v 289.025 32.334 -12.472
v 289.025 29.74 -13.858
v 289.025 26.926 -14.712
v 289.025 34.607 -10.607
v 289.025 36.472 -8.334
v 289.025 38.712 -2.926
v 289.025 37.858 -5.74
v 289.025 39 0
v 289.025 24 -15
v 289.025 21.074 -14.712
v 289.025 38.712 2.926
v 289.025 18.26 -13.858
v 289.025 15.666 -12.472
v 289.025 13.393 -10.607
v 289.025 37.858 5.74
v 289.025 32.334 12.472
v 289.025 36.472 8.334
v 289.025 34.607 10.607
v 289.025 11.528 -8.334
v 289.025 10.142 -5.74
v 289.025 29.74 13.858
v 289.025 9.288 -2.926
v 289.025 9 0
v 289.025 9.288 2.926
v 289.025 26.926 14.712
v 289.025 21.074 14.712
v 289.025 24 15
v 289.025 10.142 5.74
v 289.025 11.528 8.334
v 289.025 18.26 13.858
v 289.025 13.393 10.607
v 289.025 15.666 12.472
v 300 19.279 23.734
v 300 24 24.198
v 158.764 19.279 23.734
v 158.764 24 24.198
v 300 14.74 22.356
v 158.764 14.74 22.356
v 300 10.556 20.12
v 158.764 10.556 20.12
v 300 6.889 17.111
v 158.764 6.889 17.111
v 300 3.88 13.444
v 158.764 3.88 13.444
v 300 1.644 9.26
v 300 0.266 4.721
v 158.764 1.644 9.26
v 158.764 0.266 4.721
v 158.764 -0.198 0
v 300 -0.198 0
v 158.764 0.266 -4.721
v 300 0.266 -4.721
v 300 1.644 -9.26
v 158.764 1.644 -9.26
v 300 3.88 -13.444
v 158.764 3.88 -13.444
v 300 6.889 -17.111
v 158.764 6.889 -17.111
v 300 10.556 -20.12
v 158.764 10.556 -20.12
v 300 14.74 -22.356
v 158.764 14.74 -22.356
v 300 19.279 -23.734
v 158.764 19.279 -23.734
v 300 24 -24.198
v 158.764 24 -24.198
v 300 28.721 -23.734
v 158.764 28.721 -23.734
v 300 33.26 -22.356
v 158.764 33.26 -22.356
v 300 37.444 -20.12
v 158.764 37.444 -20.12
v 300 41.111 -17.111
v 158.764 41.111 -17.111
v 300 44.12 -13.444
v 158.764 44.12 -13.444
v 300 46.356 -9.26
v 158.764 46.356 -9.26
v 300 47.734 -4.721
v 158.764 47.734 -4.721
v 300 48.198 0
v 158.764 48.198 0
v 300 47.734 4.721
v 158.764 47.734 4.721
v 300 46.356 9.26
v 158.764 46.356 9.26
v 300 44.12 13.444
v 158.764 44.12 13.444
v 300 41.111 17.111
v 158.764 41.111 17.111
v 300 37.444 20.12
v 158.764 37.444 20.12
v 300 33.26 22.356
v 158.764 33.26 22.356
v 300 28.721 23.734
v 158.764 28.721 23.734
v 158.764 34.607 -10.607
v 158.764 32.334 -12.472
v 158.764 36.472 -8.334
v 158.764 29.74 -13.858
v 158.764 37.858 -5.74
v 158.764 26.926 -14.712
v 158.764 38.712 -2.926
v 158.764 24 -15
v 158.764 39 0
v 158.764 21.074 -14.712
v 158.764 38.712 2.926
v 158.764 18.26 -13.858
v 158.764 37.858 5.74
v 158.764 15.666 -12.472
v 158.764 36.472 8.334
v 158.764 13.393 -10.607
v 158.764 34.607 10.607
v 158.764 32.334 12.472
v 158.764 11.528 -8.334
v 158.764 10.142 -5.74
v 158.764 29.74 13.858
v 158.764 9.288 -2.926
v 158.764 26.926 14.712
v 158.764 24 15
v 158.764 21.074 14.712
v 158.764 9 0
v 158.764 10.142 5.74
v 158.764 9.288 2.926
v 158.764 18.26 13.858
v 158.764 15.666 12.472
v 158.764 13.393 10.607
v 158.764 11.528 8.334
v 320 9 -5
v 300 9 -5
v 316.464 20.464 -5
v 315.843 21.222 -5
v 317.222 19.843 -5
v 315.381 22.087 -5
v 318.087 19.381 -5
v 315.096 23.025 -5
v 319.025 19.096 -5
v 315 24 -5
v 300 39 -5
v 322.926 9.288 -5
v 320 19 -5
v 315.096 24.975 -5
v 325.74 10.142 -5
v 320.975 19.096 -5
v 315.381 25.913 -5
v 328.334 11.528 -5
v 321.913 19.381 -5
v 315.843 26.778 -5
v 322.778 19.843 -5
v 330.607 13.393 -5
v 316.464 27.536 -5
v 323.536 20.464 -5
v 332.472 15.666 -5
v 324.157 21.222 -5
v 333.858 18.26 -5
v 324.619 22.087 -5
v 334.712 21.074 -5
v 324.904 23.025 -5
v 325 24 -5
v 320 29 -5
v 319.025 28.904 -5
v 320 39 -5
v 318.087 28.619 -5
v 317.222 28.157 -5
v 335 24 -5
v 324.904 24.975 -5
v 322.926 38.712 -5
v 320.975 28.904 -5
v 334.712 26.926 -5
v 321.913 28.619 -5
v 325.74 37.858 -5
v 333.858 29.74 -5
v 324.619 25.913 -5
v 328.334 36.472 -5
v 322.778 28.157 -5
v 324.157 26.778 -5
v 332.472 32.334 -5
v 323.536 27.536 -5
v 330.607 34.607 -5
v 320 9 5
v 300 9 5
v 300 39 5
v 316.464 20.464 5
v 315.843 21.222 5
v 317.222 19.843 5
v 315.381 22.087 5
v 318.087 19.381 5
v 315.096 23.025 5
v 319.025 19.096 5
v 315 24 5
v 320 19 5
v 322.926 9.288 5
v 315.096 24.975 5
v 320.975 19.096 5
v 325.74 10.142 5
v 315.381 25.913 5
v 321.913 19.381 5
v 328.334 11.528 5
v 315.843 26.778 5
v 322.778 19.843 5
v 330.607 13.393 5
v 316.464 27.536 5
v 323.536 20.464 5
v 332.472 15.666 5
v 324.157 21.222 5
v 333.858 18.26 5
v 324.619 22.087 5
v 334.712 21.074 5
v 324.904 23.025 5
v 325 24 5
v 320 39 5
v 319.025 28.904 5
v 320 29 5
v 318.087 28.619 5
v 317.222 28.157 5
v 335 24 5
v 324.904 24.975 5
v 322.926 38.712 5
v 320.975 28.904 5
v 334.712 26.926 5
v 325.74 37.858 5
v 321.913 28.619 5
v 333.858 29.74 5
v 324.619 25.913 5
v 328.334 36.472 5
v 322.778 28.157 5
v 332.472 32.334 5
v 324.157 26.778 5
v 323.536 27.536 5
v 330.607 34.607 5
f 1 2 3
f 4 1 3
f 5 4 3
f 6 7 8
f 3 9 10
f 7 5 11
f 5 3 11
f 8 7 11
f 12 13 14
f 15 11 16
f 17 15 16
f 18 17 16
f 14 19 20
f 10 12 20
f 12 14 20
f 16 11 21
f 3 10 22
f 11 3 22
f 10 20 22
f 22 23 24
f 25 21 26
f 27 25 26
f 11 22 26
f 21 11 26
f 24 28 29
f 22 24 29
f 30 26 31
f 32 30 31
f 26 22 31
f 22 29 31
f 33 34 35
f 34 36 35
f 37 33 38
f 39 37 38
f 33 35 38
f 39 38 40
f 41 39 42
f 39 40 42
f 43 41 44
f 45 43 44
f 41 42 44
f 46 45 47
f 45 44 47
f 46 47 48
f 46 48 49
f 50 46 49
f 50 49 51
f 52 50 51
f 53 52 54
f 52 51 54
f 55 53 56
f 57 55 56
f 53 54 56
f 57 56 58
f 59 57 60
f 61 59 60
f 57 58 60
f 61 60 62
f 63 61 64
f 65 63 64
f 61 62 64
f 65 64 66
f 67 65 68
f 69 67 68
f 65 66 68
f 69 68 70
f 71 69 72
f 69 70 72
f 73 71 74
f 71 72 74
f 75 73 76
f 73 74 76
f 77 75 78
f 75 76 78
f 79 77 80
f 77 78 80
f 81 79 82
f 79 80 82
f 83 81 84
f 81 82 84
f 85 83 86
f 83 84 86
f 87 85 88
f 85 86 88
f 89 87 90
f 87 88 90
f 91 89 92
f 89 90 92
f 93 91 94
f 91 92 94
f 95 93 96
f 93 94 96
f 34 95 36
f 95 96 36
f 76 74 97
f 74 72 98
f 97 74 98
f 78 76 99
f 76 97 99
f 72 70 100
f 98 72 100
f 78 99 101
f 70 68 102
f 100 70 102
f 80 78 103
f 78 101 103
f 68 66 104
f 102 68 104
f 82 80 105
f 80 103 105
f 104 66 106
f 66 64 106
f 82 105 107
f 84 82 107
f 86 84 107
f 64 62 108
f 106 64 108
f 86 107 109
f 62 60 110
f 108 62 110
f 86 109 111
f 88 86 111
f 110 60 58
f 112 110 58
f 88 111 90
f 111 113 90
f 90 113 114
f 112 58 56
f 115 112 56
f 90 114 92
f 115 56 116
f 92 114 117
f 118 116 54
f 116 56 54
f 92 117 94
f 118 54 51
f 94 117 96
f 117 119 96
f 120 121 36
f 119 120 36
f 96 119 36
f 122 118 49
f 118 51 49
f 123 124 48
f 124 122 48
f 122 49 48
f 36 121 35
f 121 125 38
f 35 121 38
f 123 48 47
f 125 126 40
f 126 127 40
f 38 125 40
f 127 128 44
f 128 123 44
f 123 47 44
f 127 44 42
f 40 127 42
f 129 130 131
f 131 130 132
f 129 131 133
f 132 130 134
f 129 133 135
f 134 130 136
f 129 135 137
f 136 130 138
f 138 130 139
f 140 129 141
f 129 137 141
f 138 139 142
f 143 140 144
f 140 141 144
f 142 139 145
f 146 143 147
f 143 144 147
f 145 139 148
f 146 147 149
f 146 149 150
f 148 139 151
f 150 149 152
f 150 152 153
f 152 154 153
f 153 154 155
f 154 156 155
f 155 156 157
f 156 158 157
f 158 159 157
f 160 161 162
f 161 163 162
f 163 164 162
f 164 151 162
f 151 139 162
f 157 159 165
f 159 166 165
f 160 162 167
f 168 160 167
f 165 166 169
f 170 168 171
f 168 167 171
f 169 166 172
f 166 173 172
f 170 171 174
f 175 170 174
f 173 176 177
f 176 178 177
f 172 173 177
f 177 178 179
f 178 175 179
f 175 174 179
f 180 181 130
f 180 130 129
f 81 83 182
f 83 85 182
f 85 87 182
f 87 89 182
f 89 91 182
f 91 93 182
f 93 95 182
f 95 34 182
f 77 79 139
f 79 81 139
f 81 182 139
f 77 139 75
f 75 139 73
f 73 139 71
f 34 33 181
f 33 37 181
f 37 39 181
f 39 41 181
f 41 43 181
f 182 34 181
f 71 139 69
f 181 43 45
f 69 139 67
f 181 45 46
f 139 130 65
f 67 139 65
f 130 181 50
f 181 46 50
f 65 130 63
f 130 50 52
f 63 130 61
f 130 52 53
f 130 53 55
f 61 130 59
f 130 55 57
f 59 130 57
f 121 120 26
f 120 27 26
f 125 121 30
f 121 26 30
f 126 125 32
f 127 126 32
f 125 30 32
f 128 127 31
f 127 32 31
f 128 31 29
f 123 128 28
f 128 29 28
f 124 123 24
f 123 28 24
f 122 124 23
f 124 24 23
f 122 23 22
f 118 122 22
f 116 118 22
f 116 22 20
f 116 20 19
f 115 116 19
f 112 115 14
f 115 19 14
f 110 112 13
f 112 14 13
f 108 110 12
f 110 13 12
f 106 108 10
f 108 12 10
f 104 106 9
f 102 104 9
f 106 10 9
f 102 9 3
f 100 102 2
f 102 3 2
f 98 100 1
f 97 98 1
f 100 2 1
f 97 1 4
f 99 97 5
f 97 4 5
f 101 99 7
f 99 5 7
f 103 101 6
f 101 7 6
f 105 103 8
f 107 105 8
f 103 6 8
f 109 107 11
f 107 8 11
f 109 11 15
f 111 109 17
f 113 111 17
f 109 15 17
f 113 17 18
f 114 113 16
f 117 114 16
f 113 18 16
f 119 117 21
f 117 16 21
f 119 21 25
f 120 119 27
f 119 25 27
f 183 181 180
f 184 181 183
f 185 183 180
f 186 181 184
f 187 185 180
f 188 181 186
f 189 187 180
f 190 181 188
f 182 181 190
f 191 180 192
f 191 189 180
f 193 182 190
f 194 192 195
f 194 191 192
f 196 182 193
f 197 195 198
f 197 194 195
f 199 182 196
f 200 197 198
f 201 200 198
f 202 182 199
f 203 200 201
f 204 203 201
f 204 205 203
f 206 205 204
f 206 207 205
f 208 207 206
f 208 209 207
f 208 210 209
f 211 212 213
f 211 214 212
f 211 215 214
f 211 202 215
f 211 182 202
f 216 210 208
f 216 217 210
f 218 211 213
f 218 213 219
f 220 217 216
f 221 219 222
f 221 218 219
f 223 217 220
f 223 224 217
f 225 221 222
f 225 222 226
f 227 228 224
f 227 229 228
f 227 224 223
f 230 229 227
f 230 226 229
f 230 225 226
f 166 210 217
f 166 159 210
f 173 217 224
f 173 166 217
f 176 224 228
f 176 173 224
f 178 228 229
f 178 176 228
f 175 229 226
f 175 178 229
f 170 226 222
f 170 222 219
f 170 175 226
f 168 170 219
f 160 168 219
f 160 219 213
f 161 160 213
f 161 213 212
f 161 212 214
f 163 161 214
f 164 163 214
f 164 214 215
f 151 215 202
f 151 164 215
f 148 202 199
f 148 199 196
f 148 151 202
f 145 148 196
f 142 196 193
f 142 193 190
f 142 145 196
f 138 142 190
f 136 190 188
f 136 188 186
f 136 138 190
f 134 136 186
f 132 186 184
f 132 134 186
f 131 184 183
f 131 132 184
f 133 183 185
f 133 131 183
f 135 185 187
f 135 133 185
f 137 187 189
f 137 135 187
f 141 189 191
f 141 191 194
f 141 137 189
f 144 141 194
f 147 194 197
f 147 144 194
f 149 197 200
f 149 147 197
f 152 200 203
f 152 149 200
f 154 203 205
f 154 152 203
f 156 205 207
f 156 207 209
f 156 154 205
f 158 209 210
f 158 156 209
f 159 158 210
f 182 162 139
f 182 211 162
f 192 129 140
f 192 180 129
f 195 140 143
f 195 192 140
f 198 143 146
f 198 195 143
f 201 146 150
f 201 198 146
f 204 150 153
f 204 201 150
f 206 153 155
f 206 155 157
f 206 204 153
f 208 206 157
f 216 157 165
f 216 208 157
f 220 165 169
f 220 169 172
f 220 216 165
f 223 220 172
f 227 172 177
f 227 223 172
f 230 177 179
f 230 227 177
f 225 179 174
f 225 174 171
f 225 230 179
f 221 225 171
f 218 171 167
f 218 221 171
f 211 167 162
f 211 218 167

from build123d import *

# Parameters (mm, degrees)
SKETCH1_R           = 5
BOSS_EXTRUDE1_DEPTH = 5


with BuildPart() as part:
    # Sketch1 → Boss-Extrude1 (new, symmetric)
    with BuildSketch(Plane.XY):
        with BuildLine():
            Line((320, 39), (300, 39))
            Line((300, 39), (300, 9))
            Line((300, 9), (320, 9))
            ThreePointArc((320, 9), (335, 24), (320, 39))
        make_face()
        with Locations((320, 24)):
            Circle(SKETCH1_R, mode=Mode.SUBTRACT)
    extrude(amount=BOSS_EXTRUDE1_DEPTH, both=True)

    # Sketch4 → Revolve2 (revolve)
    with BuildSketch(Plane.XY, mode=Mode.PRIVATE) as revolve2_sk:
        Polygon((300, 39), (300, 48.198468166), (158.764392762, 48.198468166), (158.764392762, 39), (289.025351805, 39), (289.025351805, 24), (300, 24), align=None)
    revolve(revolve2_sk.sketch.rotate(Axis((289.025351805, 24, 0), (1, 0, 0)), 90), axis=Axis((289.025351805, 24, 0), (1, 0, 0)))


solid = part.part
